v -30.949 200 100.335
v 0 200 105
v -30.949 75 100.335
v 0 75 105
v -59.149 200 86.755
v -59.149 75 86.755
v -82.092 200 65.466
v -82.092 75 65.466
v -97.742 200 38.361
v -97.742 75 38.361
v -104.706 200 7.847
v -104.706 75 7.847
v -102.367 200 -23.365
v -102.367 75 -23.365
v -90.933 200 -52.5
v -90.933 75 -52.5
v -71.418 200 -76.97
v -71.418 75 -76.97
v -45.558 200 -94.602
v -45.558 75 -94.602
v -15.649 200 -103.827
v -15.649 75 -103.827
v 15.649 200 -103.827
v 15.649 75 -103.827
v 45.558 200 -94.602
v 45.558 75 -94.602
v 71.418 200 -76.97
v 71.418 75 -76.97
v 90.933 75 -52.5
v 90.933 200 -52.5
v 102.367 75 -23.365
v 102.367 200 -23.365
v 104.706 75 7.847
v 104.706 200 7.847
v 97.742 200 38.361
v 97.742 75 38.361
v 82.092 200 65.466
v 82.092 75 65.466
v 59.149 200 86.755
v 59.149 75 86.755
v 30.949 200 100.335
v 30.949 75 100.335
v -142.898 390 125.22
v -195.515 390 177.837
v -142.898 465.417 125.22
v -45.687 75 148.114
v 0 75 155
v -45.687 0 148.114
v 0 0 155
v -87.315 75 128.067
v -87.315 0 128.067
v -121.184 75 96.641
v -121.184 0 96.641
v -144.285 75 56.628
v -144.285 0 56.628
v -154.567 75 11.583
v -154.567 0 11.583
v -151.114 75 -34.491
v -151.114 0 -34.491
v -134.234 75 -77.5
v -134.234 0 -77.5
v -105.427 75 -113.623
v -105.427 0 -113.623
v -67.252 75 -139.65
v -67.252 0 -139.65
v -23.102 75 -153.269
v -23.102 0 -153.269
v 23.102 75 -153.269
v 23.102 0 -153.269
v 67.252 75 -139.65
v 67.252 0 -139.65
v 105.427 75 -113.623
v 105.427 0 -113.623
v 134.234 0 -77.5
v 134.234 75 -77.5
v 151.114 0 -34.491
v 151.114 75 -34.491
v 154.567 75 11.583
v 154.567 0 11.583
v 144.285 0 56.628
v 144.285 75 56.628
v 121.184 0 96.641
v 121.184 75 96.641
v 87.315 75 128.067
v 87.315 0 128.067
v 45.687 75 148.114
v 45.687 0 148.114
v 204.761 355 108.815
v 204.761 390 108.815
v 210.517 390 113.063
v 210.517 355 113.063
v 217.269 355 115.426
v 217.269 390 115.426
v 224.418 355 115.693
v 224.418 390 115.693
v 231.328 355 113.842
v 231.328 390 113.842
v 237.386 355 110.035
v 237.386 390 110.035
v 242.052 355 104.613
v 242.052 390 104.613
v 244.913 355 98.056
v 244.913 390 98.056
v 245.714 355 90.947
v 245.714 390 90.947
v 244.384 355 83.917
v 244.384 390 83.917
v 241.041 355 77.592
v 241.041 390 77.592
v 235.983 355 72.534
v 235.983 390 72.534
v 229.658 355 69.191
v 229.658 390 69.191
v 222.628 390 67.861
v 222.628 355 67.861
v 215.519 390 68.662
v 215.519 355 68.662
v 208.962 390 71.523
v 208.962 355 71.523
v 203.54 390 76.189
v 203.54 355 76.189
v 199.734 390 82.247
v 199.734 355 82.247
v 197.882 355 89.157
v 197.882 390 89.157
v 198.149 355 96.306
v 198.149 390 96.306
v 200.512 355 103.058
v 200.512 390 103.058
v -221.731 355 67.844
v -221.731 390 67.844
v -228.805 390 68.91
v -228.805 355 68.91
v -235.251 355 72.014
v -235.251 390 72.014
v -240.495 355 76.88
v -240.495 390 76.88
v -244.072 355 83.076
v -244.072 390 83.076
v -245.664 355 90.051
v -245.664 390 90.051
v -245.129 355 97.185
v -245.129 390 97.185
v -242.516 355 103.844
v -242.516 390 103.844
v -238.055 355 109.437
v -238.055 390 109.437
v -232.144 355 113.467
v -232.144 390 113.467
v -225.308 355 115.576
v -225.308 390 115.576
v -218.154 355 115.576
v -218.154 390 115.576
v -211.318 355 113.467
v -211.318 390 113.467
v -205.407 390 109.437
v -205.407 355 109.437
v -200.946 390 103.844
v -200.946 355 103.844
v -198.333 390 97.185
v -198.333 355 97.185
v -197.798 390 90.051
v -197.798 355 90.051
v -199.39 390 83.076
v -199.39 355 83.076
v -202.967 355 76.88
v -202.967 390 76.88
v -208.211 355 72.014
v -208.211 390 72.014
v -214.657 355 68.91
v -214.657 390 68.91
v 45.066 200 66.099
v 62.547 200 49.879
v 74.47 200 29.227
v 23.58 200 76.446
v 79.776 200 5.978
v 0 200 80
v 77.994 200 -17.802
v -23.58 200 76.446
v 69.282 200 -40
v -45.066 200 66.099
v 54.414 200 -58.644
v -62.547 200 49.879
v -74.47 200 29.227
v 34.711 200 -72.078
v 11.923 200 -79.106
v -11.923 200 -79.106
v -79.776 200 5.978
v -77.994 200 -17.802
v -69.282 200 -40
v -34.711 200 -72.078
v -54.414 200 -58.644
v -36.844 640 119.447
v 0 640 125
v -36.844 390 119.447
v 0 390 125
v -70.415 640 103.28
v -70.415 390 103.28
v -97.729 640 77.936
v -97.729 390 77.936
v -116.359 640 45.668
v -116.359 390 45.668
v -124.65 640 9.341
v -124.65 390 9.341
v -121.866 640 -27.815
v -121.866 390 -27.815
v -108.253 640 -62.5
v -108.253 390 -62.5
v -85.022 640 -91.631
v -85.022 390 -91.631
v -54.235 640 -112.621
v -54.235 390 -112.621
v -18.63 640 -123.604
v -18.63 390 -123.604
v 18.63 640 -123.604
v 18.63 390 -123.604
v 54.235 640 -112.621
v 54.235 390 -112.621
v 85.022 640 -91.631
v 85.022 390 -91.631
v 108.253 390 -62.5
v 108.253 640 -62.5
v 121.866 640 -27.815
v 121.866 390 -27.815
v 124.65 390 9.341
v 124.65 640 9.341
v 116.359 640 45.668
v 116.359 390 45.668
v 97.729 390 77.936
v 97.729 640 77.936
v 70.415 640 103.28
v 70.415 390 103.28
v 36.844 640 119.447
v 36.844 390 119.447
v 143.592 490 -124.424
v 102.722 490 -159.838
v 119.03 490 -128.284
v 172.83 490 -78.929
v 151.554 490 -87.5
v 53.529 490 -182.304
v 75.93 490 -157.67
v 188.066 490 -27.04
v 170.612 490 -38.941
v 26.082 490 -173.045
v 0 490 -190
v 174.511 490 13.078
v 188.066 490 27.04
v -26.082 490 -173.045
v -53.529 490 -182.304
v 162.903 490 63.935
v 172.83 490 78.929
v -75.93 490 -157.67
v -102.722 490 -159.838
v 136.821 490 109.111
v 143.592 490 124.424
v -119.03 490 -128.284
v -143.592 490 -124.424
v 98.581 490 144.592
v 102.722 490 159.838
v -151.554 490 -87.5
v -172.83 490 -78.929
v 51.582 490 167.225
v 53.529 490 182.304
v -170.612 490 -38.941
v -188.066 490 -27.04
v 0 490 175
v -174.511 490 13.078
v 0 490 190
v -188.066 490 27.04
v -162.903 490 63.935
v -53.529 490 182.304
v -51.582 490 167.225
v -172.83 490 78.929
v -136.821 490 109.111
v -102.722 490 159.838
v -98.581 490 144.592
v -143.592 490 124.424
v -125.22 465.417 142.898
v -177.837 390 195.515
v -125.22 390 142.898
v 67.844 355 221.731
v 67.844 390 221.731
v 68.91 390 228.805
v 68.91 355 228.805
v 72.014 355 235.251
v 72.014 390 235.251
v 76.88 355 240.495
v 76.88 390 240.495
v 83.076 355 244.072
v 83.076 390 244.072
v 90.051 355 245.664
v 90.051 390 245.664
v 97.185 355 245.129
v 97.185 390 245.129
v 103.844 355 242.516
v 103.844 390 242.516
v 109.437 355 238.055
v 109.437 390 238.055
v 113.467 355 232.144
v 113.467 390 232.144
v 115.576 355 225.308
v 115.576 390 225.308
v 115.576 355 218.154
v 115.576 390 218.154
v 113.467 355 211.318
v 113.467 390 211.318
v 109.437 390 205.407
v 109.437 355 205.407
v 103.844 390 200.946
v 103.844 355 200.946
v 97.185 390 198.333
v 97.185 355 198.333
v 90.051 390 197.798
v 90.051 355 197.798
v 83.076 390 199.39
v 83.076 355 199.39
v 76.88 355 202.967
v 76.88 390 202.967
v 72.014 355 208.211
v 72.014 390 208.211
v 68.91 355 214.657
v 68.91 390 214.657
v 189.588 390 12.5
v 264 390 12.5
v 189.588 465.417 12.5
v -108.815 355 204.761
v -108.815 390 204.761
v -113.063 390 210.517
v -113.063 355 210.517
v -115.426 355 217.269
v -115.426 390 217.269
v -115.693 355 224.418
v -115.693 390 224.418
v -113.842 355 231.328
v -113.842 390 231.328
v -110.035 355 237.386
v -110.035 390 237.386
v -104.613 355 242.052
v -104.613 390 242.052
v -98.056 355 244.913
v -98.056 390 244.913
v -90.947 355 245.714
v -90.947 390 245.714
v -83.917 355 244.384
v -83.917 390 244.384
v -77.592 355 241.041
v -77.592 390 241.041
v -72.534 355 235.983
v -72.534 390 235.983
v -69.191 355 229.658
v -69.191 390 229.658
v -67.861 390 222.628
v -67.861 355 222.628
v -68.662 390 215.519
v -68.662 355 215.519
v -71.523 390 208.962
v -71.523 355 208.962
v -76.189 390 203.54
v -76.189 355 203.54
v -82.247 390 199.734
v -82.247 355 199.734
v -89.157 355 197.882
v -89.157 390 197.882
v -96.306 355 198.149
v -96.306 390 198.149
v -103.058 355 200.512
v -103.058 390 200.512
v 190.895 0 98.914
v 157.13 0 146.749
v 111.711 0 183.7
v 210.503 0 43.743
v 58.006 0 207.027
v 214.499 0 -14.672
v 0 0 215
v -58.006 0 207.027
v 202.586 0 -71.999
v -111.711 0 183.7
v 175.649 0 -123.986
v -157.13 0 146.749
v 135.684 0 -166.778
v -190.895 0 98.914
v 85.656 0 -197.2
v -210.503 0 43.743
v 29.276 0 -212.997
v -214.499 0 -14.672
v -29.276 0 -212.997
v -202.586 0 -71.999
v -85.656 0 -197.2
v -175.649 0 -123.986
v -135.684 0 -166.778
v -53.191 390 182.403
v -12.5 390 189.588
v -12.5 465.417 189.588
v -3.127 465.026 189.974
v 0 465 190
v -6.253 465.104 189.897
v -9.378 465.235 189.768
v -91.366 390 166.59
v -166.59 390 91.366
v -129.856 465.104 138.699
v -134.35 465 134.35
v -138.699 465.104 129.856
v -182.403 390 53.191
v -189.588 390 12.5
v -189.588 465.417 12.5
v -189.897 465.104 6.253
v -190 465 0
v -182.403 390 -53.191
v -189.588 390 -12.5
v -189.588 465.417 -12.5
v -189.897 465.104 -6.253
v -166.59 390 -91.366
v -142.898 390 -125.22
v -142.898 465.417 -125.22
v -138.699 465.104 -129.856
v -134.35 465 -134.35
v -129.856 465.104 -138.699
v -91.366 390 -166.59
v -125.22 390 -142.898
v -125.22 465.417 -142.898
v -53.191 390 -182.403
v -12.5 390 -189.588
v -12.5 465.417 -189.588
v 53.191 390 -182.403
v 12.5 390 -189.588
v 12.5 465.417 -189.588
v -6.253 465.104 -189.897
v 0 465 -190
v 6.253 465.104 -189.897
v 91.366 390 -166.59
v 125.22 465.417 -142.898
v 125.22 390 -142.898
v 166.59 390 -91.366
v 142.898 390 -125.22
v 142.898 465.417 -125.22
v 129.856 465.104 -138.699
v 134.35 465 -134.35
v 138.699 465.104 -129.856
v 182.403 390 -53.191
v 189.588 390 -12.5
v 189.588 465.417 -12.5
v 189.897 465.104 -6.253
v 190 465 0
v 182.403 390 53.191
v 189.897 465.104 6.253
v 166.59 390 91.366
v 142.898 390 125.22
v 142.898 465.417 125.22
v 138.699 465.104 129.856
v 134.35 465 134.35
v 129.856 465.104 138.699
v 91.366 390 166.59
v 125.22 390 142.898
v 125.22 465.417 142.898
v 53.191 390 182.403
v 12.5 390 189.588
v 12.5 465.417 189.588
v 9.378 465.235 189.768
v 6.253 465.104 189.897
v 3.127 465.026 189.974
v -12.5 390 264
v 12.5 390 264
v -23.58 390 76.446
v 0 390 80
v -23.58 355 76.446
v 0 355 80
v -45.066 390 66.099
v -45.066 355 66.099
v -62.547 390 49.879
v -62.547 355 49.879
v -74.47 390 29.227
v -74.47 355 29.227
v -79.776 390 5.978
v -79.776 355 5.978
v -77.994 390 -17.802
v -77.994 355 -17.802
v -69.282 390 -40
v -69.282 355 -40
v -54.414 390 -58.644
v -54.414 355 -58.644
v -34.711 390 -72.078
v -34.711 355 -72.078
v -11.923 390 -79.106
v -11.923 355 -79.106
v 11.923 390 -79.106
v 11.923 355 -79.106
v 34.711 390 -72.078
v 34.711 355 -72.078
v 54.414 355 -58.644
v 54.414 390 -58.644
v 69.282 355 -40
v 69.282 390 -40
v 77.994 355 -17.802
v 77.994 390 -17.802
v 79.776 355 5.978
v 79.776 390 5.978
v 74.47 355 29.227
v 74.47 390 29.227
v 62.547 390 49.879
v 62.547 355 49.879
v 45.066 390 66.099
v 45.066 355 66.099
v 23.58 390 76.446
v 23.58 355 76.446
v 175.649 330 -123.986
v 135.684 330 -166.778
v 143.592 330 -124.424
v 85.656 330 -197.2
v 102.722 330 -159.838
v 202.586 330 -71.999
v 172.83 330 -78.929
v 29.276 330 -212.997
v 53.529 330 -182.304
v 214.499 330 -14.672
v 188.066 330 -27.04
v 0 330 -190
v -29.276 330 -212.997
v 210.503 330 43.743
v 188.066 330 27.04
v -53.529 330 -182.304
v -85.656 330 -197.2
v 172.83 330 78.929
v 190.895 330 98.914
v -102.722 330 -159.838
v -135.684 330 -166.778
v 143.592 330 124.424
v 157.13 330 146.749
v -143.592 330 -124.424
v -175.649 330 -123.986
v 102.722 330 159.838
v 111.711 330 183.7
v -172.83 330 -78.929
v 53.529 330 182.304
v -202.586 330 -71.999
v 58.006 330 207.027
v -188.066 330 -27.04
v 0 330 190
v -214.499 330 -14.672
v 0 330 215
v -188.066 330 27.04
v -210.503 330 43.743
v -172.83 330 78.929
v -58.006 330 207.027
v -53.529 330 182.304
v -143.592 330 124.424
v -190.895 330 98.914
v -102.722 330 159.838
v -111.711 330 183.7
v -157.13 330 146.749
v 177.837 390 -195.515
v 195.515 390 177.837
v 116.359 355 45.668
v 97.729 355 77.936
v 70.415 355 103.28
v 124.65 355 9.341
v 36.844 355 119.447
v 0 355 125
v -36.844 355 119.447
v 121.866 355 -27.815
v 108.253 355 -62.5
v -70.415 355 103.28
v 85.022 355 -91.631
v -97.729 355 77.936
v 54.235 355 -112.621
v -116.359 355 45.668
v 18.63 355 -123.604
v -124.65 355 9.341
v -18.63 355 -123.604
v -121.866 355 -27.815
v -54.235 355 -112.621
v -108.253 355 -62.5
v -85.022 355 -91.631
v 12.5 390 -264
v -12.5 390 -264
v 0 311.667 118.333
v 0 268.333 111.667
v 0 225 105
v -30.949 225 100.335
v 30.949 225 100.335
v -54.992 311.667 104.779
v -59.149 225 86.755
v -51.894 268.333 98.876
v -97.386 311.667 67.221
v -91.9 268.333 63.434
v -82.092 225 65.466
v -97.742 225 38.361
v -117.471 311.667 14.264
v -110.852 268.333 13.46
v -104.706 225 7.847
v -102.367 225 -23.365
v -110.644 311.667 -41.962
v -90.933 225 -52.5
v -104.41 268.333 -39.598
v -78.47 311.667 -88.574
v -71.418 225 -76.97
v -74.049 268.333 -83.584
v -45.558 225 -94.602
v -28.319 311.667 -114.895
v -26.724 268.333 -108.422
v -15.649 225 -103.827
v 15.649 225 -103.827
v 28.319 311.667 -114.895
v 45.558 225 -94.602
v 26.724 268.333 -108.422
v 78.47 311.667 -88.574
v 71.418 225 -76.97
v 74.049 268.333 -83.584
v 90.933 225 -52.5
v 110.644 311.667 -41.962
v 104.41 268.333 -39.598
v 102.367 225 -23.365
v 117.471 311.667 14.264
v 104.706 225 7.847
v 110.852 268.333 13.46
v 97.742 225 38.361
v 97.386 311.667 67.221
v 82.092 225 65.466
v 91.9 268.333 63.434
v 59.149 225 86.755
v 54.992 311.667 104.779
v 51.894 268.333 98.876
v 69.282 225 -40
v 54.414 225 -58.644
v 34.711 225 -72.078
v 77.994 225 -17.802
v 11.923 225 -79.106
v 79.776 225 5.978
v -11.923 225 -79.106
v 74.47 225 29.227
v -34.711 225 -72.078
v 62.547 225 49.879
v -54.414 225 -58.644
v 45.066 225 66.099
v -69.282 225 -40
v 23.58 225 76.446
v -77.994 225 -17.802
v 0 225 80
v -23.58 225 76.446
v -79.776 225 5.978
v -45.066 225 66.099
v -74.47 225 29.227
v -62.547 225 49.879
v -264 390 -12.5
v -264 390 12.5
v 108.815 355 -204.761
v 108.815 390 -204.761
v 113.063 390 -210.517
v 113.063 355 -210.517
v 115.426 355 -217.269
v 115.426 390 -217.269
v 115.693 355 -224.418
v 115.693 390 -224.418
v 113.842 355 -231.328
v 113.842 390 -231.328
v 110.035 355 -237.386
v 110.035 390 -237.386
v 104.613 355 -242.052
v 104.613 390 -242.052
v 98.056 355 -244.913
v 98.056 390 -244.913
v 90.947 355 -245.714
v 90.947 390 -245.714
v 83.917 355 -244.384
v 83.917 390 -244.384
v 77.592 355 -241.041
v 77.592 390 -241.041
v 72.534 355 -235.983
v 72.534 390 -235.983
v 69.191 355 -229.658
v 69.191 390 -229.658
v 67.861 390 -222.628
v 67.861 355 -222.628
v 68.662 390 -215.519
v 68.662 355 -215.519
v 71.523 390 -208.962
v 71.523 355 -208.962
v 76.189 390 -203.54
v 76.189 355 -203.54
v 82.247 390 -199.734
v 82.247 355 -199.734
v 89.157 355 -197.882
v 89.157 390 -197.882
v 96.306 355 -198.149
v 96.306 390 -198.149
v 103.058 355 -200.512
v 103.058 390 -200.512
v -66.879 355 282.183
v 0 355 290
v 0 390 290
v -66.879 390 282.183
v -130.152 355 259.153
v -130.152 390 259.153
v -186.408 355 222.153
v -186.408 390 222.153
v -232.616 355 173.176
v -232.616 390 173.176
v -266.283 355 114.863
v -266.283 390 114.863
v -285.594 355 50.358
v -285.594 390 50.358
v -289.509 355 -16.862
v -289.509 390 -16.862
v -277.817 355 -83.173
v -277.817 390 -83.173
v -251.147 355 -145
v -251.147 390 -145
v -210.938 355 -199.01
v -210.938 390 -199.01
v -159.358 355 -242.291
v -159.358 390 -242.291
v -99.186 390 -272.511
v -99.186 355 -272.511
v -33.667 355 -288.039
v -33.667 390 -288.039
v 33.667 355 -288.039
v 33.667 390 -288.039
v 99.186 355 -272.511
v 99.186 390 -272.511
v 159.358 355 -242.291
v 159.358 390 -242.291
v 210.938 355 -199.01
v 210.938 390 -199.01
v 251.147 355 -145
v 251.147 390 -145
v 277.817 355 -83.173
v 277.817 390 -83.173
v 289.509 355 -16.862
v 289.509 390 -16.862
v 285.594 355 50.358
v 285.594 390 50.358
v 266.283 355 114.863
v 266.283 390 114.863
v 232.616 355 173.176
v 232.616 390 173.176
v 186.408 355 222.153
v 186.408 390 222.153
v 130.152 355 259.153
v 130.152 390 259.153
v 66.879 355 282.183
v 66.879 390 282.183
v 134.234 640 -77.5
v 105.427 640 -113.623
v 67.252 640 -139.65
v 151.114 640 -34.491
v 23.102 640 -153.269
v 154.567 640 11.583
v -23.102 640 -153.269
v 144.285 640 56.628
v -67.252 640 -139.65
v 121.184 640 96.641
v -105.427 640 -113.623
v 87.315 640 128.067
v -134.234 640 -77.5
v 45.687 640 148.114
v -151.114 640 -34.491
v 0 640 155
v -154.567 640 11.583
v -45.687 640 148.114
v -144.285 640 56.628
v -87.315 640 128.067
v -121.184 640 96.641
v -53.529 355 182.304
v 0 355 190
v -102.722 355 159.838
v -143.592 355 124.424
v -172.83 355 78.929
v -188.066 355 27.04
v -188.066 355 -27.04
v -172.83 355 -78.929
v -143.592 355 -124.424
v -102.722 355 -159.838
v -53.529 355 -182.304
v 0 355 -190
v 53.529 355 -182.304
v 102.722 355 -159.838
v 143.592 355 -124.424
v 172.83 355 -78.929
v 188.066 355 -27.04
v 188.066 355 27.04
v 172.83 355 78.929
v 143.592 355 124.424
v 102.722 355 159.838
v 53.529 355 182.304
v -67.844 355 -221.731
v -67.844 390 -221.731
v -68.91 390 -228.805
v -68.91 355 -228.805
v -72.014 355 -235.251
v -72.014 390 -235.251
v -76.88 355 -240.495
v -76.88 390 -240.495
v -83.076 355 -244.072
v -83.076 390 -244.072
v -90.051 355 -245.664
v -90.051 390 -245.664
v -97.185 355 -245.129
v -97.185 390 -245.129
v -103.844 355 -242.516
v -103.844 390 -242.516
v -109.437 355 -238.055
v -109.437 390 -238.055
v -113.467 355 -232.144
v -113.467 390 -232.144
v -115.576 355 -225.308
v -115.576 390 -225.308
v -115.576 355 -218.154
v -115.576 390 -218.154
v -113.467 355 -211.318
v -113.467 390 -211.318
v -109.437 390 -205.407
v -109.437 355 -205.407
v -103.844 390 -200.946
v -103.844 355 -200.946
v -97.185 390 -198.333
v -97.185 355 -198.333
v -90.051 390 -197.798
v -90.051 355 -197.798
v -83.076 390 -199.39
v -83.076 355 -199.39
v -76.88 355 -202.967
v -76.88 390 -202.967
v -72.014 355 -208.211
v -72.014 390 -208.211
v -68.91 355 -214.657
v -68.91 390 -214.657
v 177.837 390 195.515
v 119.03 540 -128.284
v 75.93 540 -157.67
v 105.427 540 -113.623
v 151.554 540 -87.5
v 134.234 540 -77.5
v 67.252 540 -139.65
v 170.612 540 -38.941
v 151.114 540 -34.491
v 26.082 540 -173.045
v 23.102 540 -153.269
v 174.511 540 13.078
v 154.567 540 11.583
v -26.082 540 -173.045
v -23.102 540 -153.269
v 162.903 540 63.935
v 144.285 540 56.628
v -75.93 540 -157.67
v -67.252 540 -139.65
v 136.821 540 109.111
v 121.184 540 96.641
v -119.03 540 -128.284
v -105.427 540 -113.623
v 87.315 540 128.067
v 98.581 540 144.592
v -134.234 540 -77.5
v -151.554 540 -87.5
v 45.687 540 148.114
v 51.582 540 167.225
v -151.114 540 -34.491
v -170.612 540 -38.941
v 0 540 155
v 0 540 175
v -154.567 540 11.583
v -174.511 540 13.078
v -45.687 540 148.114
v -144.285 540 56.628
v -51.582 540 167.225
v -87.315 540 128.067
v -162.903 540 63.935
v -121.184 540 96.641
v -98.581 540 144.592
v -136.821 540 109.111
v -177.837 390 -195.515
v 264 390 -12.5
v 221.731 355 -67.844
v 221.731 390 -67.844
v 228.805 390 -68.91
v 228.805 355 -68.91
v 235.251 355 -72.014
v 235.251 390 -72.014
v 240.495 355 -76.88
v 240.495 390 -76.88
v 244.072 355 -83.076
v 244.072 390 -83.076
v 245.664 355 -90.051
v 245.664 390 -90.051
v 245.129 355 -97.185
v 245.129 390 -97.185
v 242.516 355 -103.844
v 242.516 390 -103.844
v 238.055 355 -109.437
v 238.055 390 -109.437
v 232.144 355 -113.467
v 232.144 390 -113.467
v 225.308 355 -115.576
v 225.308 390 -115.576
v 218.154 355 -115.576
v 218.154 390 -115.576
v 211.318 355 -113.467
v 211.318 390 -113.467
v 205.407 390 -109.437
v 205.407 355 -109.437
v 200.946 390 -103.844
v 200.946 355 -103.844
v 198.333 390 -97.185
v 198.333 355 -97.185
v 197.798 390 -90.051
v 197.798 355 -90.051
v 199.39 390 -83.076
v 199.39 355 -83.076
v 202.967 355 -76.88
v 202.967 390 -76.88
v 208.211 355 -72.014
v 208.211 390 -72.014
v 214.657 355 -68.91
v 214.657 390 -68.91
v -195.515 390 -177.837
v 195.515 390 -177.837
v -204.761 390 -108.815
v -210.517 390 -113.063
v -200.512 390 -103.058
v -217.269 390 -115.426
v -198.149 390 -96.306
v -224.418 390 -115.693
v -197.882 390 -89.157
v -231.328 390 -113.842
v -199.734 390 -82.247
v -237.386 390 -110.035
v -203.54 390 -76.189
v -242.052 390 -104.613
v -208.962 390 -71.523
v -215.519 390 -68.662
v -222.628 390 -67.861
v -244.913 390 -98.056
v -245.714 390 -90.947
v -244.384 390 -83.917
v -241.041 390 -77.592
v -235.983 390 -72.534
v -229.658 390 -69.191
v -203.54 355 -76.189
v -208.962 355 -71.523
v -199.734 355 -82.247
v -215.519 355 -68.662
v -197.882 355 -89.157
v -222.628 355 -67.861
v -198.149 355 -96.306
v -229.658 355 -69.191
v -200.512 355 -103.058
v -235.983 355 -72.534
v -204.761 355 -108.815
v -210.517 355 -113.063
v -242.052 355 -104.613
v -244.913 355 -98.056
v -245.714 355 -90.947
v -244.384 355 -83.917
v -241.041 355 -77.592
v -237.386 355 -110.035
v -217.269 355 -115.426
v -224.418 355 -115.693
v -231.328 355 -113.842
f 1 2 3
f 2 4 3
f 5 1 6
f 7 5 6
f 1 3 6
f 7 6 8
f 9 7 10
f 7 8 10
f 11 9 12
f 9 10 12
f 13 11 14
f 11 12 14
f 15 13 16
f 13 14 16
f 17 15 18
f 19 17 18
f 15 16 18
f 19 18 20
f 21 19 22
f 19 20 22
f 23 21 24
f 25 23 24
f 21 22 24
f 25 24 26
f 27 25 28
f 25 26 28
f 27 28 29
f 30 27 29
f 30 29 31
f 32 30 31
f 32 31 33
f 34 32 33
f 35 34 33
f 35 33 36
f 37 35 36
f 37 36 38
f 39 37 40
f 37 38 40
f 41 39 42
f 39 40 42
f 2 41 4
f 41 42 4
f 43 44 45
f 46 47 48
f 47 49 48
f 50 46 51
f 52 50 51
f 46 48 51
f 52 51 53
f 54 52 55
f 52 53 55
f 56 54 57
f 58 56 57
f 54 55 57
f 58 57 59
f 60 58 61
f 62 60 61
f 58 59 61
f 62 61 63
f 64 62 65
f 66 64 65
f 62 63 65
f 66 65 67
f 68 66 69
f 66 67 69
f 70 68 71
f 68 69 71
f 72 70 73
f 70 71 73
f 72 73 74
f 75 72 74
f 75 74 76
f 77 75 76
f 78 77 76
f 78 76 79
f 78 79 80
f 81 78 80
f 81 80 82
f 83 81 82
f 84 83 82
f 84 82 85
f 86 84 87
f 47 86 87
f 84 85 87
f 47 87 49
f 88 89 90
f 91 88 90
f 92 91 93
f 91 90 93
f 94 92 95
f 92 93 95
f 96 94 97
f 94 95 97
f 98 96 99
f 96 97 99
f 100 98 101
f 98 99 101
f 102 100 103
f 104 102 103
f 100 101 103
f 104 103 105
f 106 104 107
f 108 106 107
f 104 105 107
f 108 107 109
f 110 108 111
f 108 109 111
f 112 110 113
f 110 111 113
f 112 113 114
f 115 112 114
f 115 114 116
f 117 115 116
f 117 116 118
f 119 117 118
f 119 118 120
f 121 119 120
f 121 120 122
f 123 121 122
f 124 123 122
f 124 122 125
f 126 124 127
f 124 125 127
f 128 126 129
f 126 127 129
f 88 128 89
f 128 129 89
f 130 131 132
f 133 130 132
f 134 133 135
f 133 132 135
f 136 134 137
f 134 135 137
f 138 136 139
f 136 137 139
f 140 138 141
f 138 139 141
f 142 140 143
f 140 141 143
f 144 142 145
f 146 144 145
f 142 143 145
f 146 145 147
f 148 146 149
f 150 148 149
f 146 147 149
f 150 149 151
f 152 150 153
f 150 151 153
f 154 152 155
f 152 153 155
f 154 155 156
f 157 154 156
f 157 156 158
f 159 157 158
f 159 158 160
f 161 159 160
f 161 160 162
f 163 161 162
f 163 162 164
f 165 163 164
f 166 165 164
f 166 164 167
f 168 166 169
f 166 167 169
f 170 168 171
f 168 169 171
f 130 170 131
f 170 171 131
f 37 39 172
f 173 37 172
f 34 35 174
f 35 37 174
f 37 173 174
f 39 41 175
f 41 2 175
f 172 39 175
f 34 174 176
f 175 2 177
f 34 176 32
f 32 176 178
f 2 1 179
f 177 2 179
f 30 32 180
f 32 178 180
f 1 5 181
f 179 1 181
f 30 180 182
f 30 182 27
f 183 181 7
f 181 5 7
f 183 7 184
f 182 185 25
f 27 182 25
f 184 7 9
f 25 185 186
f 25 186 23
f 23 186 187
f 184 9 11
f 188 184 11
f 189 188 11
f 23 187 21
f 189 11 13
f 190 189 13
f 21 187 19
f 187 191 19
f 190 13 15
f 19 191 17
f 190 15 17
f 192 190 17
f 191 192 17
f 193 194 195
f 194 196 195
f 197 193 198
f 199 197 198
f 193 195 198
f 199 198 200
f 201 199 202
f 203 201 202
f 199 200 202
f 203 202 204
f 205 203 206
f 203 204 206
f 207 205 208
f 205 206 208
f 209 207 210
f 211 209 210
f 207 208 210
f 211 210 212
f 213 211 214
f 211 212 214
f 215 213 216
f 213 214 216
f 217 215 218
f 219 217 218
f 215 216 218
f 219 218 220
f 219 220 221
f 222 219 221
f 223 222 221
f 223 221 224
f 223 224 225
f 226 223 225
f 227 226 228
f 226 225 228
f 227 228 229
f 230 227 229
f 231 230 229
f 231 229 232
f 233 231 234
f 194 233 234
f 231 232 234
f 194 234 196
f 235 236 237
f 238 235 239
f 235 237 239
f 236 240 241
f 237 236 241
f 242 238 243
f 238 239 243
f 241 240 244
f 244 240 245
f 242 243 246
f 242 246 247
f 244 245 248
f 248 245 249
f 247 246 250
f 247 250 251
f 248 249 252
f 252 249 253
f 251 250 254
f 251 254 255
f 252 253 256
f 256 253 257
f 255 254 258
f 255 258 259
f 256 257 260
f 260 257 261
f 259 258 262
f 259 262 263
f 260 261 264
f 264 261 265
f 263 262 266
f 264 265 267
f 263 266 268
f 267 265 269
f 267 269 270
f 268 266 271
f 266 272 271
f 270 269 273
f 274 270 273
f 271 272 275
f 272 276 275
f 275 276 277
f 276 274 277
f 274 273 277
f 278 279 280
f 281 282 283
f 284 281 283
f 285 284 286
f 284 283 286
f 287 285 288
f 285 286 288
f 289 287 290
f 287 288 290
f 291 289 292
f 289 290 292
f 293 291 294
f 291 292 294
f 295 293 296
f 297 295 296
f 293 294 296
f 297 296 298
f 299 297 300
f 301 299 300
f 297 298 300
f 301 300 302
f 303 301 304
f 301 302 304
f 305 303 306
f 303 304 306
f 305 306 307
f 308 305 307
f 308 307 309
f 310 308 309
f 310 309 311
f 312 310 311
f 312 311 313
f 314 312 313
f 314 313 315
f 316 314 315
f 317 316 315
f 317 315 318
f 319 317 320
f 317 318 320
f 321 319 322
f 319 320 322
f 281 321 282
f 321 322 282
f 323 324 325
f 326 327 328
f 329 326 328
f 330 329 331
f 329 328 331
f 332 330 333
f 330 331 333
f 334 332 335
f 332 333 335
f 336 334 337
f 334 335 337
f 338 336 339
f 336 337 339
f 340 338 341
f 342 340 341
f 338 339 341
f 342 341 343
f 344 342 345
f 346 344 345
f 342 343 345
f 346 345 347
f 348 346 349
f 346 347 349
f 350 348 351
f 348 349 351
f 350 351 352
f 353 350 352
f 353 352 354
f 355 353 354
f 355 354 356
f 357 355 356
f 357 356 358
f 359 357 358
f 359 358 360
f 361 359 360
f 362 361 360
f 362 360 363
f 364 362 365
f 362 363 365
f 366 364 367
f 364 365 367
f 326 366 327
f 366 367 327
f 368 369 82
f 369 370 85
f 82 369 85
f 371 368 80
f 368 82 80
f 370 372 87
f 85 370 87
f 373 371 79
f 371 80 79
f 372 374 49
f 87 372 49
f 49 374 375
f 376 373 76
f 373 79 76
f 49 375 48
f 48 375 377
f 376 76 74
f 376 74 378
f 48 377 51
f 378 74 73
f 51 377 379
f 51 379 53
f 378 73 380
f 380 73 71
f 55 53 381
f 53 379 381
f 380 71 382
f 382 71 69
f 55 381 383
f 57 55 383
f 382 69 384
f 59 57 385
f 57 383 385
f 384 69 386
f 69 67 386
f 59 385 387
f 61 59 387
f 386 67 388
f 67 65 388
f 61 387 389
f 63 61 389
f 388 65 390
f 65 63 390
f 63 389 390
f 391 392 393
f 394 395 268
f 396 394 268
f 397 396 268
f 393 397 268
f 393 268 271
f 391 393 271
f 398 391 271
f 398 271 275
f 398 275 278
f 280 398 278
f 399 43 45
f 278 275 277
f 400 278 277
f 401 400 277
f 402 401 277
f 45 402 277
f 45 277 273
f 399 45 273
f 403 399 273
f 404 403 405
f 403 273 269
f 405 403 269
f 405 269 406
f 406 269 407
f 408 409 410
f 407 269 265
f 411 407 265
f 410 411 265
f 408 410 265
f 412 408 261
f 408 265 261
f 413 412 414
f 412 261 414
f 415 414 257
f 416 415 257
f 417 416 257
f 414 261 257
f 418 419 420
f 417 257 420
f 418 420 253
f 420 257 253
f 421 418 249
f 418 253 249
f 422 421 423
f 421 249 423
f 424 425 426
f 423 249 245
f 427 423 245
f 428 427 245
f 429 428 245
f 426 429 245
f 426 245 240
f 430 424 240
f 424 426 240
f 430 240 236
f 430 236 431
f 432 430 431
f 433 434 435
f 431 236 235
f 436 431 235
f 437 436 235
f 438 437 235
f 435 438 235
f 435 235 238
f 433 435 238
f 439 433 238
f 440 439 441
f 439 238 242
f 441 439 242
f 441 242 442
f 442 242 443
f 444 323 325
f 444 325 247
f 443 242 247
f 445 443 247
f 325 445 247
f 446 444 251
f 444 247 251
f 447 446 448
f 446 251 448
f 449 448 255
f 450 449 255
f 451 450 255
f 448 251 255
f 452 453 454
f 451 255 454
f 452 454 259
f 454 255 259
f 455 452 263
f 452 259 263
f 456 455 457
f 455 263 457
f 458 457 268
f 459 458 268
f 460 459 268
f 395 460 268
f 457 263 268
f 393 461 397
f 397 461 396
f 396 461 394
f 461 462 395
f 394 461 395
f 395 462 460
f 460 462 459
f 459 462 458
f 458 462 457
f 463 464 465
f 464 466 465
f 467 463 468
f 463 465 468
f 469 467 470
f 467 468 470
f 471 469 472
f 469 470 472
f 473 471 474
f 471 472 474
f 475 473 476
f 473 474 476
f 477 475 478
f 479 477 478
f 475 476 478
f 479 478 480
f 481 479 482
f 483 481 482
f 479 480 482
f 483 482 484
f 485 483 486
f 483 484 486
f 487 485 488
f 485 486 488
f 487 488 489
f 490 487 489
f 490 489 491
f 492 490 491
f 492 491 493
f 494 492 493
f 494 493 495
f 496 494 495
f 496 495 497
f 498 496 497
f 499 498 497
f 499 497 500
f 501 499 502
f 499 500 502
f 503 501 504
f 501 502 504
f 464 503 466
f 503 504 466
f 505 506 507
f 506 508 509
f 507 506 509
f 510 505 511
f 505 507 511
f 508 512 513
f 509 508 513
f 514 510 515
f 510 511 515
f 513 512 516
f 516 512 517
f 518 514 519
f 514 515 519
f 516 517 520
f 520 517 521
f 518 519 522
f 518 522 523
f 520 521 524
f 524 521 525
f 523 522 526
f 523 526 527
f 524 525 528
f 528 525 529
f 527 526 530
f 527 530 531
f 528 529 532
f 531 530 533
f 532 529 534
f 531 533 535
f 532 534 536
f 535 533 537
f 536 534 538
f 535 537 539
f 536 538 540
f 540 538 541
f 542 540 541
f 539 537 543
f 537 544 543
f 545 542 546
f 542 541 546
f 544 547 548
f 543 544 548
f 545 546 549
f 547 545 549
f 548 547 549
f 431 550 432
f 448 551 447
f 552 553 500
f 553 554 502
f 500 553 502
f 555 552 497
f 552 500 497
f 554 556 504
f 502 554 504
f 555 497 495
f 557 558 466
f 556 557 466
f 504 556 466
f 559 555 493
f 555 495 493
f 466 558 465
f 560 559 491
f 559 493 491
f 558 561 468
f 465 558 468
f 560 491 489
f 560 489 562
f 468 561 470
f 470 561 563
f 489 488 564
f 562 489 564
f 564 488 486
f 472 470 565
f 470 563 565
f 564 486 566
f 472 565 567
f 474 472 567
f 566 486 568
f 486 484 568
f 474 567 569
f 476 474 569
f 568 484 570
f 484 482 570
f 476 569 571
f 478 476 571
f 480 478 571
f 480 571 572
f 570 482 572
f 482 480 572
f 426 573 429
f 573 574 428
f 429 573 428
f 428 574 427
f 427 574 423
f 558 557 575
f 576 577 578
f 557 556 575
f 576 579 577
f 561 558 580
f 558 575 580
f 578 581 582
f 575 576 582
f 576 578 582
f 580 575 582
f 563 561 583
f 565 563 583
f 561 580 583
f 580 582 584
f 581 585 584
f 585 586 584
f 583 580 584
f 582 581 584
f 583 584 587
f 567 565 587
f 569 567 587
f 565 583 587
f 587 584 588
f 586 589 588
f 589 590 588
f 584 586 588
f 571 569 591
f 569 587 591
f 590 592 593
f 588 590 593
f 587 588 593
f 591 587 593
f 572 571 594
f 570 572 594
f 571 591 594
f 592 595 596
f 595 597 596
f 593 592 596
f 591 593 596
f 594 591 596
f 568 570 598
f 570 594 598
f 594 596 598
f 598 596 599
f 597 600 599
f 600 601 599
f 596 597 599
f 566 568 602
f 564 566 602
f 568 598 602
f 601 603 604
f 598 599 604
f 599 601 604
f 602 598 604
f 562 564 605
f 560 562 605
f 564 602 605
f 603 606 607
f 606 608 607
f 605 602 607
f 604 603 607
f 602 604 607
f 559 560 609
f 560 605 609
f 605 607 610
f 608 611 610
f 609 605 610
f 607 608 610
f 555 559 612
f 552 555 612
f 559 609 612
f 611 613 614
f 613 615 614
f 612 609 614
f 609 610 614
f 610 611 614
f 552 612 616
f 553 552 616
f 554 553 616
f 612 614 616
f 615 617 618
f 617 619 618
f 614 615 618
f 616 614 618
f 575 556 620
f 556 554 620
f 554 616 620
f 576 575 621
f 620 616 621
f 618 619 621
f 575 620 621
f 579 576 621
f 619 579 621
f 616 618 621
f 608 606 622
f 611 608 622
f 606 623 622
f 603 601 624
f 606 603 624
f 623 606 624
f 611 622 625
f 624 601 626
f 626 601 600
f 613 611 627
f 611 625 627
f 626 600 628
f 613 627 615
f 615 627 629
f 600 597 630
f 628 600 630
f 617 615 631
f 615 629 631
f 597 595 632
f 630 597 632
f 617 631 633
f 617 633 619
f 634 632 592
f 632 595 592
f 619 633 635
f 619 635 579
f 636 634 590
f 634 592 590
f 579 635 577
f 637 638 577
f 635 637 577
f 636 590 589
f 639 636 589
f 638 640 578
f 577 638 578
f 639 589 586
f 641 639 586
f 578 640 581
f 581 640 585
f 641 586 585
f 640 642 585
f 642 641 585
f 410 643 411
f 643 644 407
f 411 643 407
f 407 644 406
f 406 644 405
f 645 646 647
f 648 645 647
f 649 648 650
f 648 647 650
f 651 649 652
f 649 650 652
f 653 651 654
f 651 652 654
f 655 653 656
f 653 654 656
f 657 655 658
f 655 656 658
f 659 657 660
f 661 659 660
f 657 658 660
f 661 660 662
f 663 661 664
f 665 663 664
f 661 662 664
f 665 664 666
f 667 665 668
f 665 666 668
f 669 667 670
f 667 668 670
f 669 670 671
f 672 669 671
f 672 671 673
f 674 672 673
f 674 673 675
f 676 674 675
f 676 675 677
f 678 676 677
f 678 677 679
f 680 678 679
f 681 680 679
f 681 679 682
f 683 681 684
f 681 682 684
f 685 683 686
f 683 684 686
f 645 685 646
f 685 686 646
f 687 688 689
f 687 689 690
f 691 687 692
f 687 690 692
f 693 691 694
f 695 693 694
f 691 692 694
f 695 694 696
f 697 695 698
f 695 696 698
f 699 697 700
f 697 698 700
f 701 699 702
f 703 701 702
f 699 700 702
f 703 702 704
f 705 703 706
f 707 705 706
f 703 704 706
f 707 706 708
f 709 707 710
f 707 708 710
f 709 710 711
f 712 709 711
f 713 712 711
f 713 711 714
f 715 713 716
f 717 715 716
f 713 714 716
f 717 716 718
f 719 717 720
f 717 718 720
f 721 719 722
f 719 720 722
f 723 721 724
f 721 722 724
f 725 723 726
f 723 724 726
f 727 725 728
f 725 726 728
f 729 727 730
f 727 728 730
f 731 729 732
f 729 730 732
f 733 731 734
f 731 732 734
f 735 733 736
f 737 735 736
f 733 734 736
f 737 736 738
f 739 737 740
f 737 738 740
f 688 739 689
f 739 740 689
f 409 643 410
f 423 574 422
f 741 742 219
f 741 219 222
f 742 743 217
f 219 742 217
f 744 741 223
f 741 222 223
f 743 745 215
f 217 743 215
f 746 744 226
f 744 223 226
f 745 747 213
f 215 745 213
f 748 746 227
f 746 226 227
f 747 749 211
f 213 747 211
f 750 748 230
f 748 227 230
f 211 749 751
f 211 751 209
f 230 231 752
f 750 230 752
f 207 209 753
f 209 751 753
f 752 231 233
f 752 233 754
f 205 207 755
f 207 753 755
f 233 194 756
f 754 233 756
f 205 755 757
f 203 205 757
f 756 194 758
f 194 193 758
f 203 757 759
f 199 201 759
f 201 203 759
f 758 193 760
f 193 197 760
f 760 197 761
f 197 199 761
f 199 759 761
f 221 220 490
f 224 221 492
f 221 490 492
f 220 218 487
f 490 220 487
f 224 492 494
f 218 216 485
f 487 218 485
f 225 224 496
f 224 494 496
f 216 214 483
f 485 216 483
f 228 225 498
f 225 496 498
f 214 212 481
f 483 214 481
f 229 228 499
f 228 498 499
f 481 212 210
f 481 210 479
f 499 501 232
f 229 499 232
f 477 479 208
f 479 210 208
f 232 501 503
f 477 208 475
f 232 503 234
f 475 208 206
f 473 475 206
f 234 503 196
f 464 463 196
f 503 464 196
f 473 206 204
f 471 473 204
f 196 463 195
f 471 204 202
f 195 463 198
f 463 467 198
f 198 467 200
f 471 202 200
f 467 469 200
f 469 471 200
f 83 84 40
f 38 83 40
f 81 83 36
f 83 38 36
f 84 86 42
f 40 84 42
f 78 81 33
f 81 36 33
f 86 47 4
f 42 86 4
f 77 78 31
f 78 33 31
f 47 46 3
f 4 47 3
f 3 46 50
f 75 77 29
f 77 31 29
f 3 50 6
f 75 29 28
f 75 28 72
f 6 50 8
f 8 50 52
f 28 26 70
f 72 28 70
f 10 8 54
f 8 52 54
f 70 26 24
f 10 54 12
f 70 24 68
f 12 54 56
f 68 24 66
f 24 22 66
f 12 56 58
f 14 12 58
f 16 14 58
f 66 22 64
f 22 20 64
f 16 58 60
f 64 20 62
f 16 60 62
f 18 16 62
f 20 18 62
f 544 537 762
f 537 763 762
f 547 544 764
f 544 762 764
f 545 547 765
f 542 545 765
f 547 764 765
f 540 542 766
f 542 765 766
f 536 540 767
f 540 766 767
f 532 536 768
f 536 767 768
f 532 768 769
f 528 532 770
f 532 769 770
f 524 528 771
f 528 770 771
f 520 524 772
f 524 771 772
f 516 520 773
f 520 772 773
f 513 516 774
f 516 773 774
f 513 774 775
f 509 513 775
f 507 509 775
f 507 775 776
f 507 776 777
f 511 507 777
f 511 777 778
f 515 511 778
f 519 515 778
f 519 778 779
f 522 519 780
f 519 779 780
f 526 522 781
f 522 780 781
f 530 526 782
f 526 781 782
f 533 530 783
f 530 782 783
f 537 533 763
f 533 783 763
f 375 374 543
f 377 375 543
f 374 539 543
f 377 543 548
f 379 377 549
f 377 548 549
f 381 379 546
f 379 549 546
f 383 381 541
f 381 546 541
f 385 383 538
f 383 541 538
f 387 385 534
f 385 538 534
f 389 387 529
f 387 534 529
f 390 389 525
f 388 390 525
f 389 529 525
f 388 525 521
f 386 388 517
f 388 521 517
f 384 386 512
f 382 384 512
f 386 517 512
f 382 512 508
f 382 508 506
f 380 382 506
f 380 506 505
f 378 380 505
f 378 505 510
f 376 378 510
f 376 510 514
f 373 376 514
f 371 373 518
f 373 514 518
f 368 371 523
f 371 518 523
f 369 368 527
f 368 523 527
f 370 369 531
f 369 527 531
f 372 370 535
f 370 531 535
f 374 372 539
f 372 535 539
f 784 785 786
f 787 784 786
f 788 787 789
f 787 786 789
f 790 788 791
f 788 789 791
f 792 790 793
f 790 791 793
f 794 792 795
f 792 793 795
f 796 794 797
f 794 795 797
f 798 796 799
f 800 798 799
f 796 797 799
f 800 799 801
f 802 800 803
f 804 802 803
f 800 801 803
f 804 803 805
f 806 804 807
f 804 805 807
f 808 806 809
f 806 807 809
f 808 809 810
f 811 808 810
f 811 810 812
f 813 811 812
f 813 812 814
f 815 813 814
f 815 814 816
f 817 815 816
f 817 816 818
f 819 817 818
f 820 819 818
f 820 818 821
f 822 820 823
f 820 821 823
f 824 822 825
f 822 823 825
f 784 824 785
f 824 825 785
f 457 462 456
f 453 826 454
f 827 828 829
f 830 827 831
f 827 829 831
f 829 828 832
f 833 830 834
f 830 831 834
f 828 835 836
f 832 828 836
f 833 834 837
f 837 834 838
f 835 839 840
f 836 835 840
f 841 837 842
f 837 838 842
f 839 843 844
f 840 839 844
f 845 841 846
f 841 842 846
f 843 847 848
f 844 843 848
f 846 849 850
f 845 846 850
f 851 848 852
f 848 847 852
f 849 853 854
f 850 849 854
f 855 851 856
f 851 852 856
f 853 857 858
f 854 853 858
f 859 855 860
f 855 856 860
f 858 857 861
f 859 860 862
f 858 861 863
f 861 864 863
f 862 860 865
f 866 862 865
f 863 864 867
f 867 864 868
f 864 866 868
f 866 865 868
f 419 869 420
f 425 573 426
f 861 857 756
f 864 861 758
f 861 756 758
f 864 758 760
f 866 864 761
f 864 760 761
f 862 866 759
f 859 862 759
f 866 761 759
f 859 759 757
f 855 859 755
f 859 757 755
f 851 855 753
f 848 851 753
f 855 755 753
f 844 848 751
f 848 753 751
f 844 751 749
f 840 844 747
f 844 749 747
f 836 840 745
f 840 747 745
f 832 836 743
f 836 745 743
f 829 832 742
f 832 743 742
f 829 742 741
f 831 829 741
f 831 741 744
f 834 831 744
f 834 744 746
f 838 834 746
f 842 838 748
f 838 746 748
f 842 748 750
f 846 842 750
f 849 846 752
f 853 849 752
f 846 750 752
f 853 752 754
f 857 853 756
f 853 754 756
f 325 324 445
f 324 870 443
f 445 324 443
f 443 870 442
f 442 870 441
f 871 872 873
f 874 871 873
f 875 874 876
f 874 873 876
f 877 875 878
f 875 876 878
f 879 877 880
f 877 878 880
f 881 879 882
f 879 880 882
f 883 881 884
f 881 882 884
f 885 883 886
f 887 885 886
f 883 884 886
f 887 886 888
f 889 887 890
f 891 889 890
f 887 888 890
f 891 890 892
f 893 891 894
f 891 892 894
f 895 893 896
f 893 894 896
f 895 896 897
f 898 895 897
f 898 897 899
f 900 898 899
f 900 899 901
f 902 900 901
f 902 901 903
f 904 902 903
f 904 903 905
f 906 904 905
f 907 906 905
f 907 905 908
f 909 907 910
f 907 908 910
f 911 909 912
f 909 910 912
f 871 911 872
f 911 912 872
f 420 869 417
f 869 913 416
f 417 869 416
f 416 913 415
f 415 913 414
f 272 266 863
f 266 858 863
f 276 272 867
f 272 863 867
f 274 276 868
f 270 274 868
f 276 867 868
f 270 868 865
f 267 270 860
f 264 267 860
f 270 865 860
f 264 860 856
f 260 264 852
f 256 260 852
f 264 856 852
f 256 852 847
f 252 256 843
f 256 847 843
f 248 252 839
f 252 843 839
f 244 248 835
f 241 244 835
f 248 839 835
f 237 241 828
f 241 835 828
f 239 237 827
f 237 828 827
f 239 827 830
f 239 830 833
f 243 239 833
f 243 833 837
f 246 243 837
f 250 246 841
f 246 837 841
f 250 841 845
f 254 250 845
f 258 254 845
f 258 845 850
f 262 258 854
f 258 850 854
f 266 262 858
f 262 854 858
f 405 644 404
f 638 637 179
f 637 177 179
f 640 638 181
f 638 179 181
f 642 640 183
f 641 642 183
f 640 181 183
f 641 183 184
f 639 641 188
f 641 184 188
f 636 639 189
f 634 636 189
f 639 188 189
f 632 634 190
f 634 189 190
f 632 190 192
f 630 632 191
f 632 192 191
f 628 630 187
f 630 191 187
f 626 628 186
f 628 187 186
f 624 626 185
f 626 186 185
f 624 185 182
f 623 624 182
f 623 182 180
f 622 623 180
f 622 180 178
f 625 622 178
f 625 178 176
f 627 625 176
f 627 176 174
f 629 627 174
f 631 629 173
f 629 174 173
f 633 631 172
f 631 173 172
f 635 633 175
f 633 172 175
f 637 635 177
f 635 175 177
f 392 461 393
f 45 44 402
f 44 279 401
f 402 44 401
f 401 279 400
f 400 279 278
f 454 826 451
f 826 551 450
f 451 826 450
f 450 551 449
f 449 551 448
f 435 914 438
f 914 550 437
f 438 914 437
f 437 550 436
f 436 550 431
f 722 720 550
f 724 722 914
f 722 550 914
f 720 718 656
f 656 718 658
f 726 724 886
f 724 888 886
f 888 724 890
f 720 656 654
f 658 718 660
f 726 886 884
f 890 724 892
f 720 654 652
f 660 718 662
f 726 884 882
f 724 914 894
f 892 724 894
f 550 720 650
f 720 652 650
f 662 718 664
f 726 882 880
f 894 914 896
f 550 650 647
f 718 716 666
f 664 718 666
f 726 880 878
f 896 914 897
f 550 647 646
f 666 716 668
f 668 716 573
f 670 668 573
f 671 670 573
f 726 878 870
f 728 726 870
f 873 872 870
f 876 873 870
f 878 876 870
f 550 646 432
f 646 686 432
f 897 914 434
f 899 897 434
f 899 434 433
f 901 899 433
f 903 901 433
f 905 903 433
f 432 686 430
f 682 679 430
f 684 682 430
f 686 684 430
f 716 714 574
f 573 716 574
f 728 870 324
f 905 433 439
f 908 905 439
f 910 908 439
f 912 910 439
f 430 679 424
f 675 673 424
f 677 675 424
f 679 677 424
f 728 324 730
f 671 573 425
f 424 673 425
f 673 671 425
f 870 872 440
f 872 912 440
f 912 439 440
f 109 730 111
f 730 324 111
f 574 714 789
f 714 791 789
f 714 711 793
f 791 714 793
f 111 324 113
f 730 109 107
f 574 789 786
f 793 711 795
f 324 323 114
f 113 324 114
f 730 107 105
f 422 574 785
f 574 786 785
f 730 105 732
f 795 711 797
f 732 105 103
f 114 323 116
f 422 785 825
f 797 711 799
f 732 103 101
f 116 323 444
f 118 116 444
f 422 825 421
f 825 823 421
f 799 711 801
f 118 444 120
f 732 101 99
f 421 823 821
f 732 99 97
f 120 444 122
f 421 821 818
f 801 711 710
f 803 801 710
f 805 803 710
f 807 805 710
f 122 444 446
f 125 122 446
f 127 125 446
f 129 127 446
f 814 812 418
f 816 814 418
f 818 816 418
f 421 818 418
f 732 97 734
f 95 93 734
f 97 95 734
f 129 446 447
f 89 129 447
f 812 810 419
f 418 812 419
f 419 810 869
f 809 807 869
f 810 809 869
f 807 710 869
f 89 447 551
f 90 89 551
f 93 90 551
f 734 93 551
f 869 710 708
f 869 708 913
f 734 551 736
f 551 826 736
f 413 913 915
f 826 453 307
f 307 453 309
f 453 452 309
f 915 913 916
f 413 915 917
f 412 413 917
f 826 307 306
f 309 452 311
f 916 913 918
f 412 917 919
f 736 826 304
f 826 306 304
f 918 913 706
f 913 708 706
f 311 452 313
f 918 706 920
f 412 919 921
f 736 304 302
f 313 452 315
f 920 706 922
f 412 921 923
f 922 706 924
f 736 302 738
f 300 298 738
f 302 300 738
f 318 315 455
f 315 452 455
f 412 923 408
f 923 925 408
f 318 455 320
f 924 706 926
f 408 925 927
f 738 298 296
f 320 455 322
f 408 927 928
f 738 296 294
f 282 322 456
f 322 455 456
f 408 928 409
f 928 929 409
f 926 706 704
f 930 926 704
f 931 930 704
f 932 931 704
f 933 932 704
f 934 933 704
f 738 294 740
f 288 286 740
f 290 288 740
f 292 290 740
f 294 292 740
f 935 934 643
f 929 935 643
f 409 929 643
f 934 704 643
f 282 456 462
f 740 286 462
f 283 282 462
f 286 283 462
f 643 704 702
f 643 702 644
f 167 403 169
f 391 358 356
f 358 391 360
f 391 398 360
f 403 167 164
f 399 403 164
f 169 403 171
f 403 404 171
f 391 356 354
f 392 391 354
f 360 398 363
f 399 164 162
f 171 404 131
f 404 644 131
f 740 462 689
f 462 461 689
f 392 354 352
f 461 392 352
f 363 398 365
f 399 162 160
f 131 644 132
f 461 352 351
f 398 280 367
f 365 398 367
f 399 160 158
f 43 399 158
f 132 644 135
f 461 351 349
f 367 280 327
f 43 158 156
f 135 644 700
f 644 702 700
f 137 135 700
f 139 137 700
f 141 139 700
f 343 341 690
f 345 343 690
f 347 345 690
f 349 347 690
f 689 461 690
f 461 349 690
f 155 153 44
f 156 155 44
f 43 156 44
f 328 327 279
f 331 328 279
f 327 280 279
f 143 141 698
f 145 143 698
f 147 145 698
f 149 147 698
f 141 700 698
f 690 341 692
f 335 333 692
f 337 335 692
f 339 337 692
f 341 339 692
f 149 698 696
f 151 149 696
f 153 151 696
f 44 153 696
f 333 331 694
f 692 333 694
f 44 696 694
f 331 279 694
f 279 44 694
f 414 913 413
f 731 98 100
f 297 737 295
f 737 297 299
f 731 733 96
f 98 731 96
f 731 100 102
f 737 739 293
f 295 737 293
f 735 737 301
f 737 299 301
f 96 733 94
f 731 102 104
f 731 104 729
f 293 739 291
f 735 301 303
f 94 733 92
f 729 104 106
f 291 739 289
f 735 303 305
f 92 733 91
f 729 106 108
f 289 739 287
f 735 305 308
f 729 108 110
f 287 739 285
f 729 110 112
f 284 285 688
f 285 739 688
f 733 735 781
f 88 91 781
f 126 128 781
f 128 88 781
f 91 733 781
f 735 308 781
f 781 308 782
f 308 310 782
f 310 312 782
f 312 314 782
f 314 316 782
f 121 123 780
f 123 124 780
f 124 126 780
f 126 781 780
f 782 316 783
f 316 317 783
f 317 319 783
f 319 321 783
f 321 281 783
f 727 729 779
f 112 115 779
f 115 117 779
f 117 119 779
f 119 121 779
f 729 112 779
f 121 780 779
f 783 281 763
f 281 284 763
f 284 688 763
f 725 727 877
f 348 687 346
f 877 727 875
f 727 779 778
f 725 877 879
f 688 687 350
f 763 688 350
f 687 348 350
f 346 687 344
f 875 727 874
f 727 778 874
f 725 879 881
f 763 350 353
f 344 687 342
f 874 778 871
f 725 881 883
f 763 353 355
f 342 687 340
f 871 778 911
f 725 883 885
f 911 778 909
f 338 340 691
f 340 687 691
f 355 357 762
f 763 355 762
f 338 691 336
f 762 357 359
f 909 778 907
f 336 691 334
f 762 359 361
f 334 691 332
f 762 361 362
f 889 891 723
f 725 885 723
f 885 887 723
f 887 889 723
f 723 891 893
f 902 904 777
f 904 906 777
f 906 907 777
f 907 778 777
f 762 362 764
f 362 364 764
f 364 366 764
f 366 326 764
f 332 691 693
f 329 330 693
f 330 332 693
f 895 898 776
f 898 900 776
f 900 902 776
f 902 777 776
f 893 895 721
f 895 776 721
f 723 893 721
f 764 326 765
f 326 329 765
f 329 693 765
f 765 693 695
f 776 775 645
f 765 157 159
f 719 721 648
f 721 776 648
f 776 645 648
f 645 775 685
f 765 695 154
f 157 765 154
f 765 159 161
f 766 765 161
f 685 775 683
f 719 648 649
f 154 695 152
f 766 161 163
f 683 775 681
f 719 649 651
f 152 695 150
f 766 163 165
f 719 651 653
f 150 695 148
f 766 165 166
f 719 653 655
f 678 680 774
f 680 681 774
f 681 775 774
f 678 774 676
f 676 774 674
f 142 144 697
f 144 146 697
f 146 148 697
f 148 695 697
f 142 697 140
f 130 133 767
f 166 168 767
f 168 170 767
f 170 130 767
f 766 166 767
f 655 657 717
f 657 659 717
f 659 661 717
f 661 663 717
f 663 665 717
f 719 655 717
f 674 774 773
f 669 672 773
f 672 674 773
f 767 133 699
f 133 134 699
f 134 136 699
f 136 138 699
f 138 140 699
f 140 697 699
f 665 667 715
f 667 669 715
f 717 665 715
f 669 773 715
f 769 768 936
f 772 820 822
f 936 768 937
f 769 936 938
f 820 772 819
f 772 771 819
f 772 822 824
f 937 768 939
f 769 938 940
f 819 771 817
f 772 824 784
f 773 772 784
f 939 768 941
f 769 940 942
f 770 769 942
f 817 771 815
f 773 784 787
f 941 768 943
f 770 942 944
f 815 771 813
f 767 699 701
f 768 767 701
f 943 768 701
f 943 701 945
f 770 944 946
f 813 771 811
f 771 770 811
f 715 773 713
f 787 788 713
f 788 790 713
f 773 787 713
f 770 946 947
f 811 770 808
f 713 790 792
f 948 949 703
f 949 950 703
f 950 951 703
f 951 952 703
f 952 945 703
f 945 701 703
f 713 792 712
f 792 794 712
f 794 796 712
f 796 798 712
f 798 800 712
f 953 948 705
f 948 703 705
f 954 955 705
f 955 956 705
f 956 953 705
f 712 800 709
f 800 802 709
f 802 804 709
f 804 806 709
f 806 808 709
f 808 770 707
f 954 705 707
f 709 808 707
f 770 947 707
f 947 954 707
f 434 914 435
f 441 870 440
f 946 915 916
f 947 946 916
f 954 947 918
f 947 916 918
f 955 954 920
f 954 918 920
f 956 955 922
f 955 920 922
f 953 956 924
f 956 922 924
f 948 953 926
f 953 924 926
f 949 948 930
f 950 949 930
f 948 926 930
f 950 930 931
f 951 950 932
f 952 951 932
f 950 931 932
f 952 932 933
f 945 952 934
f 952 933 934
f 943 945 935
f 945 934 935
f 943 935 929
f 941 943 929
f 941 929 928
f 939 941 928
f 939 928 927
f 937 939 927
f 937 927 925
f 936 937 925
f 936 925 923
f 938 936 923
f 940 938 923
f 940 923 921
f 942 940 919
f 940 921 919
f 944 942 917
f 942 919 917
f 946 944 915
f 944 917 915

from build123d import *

# Parameters (mm, degrees)
RIB1_REACH         = 292
SKETCH2_WALL_W     = 687.361283212
SKETCH2_WALL_H     = 25
SKETCH3_R          = 24
CUT_EXTRUDE1_DEPTH = 35
CIRPATTERN1_COUNT  = 8
CIRPATTERN2_COUNT  = 8


with BuildPart() as part:
    # Sketch1 → Revolve1 (revolve)
    with BuildSketch(Plane.XY, mode=Mode.PRIVATE) as revolve1_sk:
        Polygon((125, 640), (125, 390), (80, 390), (80, 355), (125, 355), (105, 225), (80, 225), (80, 200), (105, 200), (105, 75), (155, 75), (155, 0), (215, 0), (215, 330), (190, 330), (190, 355), (290, 355), (290, 390), (190, 390), (190, 490), (175, 490), (175, 540), (155, 540), (155, 640), align=None)
    revolve(revolve1_sk.sketch.rotate(Axis((0, 580.752844837, 0), (0, -1, 0)), 90), axis=Axis((0, 580.752844837, 0), (0, -1, 0)))  # turned: the seam where the file's is

    # Sketch2 wall → Rib1 (add, up to next)
    with BuildSketch(Plane(origin=(227, 427.5, 0), x_dir=(-0.70234528, 0.711836433, 0), z_dir=(-0.711836433, -0.70234528, 0)), mode=Mode.PRIVATE) as rib1_sk1:
        Rectangle(SKETCH2_WALL_W, SKETCH2_WALL_H)
    rib1_tool1 = extrude(rib1_sk1.sketch, amount=RIB1_REACH, mode=Mode.PRIVATE) - part.part
    rib1 = rib1_tool1.solids().sort_by_distance((227, 427.5, 0))[0]
    add(rib1)

    # Sketch3 → Cut-Extrude1 (cut)
    with BuildSketch(Plane(origin=(0, 390, 0), x_dir=(1, 0, 0), z_dir=(0, 1, 0))):
        with Locations(Location((221.731087803, 91.844023768, 0), (0, 0, 270))):  # turned: the seam where the file's is
            Circle(SKETCH3_R)
    cut_extrude1 = extrude(amount=-CUT_EXTRUDE1_DEPTH, mode=Mode.SUBTRACT)

    # CirPattern1: Rib1 ×8 about axis
    cirpattern1_axis = Axis((0, 0, 0), (0, 1, 0))
    for i in range(1, CIRPATTERN1_COUNT):
        add(rib1.rotate(cirpattern1_axis, i * 360 / CIRPATTERN1_COUNT))

    # CirPattern2: Cut-Extrude1 ×8 about axis
    cirpattern2_axis = Axis((0, 0, 0), (0, 1, 0))
    for i in range(1, CIRPATTERN2_COUNT):
        add(cut_extrude1.rotate(cirpattern2_axis, i * 360 / CIRPATTERN2_COUNT), mode=Mode.SUBTRACT)


solid = part.part
